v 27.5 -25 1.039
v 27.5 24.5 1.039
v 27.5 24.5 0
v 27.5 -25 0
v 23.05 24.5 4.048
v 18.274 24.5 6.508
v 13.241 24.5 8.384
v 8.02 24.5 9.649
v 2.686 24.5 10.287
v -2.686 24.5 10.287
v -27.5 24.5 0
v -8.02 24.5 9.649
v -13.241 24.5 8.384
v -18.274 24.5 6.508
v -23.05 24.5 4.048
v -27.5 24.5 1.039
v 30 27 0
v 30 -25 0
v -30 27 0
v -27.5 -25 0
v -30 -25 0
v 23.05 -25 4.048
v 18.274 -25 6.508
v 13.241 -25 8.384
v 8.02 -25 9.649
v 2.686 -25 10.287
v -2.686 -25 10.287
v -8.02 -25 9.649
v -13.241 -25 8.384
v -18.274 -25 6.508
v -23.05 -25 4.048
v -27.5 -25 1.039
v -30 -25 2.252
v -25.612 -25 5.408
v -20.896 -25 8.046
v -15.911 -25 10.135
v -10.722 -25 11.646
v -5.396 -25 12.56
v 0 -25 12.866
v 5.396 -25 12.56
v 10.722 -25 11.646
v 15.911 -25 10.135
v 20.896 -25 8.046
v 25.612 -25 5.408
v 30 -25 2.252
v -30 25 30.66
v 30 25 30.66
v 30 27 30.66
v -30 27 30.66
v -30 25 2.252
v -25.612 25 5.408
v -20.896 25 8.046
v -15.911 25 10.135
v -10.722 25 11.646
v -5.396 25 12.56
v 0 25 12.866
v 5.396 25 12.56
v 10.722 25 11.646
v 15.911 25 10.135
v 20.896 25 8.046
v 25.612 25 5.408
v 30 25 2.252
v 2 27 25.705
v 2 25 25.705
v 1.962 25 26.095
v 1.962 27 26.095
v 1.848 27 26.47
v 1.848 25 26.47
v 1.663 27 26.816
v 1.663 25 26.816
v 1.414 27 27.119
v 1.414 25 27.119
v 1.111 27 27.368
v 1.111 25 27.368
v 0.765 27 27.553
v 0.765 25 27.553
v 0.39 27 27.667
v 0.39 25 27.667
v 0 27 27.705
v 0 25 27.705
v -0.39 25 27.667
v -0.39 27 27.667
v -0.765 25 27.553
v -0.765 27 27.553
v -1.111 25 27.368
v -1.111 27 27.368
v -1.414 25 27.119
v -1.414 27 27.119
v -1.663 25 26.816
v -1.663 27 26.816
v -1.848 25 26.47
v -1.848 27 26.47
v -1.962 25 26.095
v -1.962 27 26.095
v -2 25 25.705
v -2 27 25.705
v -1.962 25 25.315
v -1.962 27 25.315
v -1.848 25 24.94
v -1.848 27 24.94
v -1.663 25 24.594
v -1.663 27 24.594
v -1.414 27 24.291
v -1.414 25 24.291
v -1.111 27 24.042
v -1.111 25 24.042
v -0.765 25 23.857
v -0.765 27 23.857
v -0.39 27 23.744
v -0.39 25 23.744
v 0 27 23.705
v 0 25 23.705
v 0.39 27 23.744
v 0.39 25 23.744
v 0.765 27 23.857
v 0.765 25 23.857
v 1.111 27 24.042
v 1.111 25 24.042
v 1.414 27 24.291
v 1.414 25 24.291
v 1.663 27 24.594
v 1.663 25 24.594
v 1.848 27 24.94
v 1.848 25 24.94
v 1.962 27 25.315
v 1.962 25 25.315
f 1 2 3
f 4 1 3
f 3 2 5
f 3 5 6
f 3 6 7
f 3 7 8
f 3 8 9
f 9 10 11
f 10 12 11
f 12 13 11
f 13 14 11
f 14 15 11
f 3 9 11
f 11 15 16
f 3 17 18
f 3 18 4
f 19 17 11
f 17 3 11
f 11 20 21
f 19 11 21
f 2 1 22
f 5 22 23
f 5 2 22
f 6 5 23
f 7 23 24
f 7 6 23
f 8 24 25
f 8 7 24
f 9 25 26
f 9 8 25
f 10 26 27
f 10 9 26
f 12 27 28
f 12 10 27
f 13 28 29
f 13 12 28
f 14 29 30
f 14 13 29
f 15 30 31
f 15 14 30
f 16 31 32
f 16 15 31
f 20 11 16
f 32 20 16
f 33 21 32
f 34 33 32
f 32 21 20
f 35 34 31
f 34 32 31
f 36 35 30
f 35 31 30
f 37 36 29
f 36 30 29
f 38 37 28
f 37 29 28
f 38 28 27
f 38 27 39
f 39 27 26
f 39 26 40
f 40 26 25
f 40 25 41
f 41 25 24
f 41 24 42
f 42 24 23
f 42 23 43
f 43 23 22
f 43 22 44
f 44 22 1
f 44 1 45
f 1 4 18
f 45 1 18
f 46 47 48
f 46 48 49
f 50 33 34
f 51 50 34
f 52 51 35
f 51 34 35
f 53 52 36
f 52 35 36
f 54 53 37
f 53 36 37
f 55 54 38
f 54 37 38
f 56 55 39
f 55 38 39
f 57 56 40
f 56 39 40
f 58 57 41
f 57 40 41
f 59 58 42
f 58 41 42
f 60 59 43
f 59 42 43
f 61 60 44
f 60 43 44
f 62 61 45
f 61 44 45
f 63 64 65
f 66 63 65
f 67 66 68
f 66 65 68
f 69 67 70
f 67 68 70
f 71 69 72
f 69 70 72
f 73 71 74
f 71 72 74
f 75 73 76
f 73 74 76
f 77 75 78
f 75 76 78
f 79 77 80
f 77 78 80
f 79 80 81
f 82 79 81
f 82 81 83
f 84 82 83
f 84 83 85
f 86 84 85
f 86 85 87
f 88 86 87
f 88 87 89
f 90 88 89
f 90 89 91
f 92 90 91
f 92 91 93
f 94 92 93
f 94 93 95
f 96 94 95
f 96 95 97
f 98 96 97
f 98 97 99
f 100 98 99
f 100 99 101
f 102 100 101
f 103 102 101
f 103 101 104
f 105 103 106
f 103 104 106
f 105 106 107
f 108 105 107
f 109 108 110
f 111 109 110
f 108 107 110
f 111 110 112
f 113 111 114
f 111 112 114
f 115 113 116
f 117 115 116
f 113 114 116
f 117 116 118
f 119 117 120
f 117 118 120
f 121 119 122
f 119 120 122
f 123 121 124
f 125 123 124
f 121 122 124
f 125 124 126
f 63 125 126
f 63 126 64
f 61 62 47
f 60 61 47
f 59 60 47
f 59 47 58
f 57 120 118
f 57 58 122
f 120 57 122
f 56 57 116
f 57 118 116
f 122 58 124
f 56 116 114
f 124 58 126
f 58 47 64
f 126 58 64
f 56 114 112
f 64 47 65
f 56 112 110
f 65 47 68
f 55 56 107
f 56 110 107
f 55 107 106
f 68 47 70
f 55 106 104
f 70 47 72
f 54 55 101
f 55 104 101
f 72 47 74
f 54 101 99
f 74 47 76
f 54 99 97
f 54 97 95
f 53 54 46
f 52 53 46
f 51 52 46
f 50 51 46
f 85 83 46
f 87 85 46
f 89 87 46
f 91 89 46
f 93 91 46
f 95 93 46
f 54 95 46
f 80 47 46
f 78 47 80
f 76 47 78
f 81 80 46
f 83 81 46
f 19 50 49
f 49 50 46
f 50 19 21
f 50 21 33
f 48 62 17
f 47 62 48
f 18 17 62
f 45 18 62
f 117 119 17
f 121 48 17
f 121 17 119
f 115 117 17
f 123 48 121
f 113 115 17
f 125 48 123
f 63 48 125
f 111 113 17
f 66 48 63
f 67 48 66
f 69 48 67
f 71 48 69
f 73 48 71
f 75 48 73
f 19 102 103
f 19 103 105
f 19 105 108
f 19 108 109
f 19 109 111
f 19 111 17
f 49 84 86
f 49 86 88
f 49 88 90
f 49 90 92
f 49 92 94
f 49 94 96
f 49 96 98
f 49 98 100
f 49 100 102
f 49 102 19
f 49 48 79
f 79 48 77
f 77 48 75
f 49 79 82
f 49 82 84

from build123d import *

# Parameters (mm, degrees)
F0_W     = 60
F0_H     = 50
F1_DEPTH = 25
F3_DEPTH = 50.001
F4_W     = 60
F4_H     = 30.659744516
F5_DEPTH = 2
F6_R     = 2
F7_DEPTH = 2.001
F8_T     = -2.5
F9_DEPTH = 25


# Not quite as in the source:
# - a feature of the source that left no trace in its solid (it failed there, or was rolled back) is left out


with BuildPart() as f1:
    # F0 (on Top) → F1 (new body)
    with BuildSketch(Plane.XY):
        Rectangle(F0_W, F0_H)
    extrude(amount=F1_DEPTH)

    # F2 (on face) → F3 (cut, through all)
    with BuildSketch(Plane.XZ.offset(25)):
        with BuildLine():
            ThreePointArc((-30, 2.2523000371), (0, 12.8664154965), (30, 2.2523000371))
            Line((30, 2.2523000371), (30, 25))
            Line((30, 25), (-30, 25))
            Line((-30, 25), (-30, 2.2523000371))
        make_face()
    extrude(amount=-F3_DEPTH, mode=Mode.SUBTRACT)

    # F4 (on face) → F5 (join)
    with BuildSketch(Plane(origin=(0, 25, 0), x_dir=(-1, 0, 0), z_dir=(0, 1, 0))):
        with Locations((0, 15.329872258)):
            Rectangle(F4_W, F4_H)
    extrude(amount=F5_DEPTH)

    # F6 (on face) → F7 (cut, through all)
    with BuildSketch(Plane.XZ.offset(-25)):
        with Locations((0, 25.7051046938)):
            Circle(F6_R)
    extrude(amount=-F7_DEPTH, mode=Mode.SUBTRACT)

    # F8
    f8_openings = [f1.faces().sort_by_distance(p)[0] for p in [
        (0, 1, 0),
    ]]
    offset(amount=F8_T, openings=f8_openings)

    # F9 (cut): a face of the model
    f9_faces = [f1.faces().sort_by_distance(p)[0] for p in [
        (0, -22.5, 4.2031942767),
    ]]
    extrude(f9_faces, amount=-F9_DEPTH, mode=Mode.SUBTRACT)


solid = f1.part
